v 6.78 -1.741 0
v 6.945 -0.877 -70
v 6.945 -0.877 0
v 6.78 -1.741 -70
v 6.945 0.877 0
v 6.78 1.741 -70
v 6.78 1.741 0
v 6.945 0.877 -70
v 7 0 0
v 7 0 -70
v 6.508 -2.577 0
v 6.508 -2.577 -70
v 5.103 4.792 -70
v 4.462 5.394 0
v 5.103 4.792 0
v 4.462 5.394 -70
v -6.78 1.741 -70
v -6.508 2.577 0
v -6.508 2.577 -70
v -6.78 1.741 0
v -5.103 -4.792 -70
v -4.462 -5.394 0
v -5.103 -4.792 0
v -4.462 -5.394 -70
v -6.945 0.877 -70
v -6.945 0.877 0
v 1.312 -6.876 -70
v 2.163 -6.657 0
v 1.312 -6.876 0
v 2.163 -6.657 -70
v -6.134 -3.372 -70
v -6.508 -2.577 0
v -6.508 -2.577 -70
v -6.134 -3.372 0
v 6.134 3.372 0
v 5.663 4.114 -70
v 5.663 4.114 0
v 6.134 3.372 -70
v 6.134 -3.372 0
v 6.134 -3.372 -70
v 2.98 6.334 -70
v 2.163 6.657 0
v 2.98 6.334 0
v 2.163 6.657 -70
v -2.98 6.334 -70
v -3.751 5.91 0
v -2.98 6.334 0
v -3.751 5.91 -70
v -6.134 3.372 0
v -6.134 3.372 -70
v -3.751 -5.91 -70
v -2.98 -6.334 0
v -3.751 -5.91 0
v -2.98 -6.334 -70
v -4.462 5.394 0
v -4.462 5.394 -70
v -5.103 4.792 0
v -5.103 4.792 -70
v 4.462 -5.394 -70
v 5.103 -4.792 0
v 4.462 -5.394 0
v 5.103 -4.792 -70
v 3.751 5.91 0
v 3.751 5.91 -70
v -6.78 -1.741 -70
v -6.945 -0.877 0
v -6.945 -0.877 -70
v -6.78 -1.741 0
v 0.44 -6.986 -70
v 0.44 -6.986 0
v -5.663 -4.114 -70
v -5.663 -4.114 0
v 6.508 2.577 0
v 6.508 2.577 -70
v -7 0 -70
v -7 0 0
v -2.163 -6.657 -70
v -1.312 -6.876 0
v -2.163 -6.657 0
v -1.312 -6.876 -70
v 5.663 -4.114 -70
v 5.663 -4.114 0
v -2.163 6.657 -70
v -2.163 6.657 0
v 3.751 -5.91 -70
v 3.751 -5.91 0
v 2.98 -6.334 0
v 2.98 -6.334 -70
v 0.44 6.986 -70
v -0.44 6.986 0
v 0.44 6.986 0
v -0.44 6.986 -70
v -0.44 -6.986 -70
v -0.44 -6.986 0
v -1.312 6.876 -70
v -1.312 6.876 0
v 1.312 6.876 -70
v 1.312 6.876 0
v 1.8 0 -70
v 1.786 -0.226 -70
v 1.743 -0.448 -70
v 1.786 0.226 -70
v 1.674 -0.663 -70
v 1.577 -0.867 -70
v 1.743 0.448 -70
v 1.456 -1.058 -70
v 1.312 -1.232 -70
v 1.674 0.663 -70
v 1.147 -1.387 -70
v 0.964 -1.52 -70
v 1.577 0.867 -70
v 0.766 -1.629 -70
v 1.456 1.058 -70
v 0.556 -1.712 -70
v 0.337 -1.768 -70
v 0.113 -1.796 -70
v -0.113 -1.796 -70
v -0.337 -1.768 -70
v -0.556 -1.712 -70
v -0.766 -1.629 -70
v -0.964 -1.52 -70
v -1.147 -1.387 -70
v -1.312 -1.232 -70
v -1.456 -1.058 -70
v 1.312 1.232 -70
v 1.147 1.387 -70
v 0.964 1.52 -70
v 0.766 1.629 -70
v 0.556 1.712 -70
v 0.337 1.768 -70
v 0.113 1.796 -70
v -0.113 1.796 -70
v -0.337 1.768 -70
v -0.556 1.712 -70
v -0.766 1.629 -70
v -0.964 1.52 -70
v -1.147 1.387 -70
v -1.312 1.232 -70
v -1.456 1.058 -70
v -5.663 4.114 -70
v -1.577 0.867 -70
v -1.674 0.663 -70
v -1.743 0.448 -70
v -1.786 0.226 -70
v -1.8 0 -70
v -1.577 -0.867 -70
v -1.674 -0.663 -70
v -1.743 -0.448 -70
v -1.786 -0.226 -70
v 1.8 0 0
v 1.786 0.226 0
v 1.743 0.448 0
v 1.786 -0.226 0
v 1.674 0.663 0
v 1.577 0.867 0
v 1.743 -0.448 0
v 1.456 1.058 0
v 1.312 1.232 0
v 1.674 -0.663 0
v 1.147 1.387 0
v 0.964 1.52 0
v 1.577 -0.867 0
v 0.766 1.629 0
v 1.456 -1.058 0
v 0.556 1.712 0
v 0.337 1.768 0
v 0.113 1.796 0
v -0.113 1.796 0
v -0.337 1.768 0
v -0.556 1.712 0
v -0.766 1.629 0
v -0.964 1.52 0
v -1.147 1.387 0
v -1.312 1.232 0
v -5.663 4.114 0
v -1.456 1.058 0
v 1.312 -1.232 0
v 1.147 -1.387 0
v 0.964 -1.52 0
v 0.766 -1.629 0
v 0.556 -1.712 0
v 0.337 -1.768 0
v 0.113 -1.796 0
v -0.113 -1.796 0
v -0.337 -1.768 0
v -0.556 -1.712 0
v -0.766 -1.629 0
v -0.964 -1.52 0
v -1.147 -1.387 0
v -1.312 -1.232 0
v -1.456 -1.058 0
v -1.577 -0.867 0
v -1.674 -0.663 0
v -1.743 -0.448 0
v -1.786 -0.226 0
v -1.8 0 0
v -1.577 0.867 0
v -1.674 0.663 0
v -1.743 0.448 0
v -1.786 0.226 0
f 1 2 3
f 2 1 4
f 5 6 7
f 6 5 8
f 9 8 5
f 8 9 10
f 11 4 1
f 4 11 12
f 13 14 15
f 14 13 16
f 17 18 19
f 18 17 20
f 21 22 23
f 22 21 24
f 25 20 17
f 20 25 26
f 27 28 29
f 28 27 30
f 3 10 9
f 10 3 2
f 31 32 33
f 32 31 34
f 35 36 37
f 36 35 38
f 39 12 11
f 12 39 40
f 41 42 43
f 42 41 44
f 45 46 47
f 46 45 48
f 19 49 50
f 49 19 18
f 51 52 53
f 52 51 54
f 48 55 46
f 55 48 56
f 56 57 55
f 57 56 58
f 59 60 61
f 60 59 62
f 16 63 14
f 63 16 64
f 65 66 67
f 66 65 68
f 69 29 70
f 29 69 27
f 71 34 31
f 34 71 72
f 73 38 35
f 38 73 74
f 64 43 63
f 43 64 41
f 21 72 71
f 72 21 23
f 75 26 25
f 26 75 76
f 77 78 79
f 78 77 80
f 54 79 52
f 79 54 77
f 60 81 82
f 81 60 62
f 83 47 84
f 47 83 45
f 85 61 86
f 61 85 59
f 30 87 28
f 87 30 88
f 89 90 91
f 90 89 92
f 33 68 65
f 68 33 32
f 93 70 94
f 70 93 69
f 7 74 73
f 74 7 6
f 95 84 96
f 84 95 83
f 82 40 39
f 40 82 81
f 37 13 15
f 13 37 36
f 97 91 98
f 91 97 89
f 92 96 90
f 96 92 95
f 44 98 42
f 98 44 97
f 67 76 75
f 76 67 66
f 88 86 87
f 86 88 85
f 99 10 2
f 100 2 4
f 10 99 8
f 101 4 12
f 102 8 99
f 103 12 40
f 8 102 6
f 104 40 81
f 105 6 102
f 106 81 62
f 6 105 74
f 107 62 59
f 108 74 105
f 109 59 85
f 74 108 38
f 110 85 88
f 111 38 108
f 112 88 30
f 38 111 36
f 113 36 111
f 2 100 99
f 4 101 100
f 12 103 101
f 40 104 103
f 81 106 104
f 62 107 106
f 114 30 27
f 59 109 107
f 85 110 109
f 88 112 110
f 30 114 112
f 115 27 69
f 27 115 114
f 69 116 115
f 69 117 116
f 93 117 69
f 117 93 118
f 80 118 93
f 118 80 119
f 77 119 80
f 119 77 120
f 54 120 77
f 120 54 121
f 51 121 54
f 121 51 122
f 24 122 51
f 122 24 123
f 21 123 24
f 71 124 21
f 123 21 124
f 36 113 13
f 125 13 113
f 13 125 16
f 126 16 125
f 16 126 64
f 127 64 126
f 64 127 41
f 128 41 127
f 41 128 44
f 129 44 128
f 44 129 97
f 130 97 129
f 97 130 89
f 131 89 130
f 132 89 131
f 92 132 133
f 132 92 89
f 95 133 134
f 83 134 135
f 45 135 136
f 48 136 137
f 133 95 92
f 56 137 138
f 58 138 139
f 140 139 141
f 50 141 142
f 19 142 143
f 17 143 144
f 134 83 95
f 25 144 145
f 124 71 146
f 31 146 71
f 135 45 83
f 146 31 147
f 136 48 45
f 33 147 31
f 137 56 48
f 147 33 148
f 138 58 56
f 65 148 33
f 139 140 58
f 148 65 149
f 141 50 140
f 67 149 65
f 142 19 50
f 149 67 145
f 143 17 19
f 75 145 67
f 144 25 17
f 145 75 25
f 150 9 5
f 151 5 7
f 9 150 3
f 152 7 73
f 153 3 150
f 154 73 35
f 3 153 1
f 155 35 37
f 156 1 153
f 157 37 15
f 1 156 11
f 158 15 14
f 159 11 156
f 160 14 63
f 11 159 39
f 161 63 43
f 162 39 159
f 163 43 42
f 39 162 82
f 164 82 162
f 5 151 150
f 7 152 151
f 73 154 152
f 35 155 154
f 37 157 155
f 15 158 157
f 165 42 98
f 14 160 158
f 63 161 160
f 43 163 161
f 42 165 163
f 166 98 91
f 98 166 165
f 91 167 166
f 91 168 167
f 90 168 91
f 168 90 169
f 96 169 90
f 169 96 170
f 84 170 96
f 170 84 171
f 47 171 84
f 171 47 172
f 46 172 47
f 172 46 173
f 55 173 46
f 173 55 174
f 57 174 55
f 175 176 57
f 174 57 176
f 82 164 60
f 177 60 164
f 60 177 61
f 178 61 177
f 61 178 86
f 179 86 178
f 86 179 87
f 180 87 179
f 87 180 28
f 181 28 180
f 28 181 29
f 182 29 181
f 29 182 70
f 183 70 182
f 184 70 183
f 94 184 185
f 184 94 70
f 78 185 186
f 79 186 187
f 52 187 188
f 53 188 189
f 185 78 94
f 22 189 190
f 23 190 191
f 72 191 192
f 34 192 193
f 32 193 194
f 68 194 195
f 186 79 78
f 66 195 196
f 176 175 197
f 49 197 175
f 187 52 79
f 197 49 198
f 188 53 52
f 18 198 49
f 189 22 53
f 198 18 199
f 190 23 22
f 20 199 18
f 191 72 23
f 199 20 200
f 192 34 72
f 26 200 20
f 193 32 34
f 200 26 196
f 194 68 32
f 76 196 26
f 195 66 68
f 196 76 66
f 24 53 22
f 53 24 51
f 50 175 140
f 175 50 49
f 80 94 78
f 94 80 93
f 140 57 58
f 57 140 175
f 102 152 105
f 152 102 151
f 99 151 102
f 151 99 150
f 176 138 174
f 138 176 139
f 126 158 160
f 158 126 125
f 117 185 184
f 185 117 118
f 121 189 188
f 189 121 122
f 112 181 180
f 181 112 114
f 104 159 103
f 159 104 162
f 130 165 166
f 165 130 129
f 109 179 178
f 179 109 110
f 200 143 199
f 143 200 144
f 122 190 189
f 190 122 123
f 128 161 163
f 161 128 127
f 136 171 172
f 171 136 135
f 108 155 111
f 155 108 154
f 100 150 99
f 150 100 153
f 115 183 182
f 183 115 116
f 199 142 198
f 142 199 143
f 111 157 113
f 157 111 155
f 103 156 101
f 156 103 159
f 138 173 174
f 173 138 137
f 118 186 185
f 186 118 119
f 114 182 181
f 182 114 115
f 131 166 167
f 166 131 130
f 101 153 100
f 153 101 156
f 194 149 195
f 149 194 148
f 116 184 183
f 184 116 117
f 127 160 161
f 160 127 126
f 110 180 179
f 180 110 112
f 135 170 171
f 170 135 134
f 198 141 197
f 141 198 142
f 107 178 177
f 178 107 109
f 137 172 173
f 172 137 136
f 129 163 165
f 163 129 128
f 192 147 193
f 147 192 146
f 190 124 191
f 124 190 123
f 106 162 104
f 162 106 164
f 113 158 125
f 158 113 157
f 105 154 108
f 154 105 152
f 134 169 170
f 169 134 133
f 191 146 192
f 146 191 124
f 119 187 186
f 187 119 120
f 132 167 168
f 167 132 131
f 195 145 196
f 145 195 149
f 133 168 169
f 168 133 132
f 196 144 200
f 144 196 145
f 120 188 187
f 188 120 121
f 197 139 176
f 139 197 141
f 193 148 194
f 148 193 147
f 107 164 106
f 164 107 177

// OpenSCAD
$fn = 50;


difference() {
	union() {
		translate(v = [0, 0, -70.0000000000]) {
			cylinder(h = 70, r = 7.0000000000);
		}
		cylinder(h = 0, r = 16.0000000000);
	}
	union() {
		#translate(v = [0, 0, -70]) {
			cylinder(h = 70, r = 1.8000000000);
		}
	}
}
